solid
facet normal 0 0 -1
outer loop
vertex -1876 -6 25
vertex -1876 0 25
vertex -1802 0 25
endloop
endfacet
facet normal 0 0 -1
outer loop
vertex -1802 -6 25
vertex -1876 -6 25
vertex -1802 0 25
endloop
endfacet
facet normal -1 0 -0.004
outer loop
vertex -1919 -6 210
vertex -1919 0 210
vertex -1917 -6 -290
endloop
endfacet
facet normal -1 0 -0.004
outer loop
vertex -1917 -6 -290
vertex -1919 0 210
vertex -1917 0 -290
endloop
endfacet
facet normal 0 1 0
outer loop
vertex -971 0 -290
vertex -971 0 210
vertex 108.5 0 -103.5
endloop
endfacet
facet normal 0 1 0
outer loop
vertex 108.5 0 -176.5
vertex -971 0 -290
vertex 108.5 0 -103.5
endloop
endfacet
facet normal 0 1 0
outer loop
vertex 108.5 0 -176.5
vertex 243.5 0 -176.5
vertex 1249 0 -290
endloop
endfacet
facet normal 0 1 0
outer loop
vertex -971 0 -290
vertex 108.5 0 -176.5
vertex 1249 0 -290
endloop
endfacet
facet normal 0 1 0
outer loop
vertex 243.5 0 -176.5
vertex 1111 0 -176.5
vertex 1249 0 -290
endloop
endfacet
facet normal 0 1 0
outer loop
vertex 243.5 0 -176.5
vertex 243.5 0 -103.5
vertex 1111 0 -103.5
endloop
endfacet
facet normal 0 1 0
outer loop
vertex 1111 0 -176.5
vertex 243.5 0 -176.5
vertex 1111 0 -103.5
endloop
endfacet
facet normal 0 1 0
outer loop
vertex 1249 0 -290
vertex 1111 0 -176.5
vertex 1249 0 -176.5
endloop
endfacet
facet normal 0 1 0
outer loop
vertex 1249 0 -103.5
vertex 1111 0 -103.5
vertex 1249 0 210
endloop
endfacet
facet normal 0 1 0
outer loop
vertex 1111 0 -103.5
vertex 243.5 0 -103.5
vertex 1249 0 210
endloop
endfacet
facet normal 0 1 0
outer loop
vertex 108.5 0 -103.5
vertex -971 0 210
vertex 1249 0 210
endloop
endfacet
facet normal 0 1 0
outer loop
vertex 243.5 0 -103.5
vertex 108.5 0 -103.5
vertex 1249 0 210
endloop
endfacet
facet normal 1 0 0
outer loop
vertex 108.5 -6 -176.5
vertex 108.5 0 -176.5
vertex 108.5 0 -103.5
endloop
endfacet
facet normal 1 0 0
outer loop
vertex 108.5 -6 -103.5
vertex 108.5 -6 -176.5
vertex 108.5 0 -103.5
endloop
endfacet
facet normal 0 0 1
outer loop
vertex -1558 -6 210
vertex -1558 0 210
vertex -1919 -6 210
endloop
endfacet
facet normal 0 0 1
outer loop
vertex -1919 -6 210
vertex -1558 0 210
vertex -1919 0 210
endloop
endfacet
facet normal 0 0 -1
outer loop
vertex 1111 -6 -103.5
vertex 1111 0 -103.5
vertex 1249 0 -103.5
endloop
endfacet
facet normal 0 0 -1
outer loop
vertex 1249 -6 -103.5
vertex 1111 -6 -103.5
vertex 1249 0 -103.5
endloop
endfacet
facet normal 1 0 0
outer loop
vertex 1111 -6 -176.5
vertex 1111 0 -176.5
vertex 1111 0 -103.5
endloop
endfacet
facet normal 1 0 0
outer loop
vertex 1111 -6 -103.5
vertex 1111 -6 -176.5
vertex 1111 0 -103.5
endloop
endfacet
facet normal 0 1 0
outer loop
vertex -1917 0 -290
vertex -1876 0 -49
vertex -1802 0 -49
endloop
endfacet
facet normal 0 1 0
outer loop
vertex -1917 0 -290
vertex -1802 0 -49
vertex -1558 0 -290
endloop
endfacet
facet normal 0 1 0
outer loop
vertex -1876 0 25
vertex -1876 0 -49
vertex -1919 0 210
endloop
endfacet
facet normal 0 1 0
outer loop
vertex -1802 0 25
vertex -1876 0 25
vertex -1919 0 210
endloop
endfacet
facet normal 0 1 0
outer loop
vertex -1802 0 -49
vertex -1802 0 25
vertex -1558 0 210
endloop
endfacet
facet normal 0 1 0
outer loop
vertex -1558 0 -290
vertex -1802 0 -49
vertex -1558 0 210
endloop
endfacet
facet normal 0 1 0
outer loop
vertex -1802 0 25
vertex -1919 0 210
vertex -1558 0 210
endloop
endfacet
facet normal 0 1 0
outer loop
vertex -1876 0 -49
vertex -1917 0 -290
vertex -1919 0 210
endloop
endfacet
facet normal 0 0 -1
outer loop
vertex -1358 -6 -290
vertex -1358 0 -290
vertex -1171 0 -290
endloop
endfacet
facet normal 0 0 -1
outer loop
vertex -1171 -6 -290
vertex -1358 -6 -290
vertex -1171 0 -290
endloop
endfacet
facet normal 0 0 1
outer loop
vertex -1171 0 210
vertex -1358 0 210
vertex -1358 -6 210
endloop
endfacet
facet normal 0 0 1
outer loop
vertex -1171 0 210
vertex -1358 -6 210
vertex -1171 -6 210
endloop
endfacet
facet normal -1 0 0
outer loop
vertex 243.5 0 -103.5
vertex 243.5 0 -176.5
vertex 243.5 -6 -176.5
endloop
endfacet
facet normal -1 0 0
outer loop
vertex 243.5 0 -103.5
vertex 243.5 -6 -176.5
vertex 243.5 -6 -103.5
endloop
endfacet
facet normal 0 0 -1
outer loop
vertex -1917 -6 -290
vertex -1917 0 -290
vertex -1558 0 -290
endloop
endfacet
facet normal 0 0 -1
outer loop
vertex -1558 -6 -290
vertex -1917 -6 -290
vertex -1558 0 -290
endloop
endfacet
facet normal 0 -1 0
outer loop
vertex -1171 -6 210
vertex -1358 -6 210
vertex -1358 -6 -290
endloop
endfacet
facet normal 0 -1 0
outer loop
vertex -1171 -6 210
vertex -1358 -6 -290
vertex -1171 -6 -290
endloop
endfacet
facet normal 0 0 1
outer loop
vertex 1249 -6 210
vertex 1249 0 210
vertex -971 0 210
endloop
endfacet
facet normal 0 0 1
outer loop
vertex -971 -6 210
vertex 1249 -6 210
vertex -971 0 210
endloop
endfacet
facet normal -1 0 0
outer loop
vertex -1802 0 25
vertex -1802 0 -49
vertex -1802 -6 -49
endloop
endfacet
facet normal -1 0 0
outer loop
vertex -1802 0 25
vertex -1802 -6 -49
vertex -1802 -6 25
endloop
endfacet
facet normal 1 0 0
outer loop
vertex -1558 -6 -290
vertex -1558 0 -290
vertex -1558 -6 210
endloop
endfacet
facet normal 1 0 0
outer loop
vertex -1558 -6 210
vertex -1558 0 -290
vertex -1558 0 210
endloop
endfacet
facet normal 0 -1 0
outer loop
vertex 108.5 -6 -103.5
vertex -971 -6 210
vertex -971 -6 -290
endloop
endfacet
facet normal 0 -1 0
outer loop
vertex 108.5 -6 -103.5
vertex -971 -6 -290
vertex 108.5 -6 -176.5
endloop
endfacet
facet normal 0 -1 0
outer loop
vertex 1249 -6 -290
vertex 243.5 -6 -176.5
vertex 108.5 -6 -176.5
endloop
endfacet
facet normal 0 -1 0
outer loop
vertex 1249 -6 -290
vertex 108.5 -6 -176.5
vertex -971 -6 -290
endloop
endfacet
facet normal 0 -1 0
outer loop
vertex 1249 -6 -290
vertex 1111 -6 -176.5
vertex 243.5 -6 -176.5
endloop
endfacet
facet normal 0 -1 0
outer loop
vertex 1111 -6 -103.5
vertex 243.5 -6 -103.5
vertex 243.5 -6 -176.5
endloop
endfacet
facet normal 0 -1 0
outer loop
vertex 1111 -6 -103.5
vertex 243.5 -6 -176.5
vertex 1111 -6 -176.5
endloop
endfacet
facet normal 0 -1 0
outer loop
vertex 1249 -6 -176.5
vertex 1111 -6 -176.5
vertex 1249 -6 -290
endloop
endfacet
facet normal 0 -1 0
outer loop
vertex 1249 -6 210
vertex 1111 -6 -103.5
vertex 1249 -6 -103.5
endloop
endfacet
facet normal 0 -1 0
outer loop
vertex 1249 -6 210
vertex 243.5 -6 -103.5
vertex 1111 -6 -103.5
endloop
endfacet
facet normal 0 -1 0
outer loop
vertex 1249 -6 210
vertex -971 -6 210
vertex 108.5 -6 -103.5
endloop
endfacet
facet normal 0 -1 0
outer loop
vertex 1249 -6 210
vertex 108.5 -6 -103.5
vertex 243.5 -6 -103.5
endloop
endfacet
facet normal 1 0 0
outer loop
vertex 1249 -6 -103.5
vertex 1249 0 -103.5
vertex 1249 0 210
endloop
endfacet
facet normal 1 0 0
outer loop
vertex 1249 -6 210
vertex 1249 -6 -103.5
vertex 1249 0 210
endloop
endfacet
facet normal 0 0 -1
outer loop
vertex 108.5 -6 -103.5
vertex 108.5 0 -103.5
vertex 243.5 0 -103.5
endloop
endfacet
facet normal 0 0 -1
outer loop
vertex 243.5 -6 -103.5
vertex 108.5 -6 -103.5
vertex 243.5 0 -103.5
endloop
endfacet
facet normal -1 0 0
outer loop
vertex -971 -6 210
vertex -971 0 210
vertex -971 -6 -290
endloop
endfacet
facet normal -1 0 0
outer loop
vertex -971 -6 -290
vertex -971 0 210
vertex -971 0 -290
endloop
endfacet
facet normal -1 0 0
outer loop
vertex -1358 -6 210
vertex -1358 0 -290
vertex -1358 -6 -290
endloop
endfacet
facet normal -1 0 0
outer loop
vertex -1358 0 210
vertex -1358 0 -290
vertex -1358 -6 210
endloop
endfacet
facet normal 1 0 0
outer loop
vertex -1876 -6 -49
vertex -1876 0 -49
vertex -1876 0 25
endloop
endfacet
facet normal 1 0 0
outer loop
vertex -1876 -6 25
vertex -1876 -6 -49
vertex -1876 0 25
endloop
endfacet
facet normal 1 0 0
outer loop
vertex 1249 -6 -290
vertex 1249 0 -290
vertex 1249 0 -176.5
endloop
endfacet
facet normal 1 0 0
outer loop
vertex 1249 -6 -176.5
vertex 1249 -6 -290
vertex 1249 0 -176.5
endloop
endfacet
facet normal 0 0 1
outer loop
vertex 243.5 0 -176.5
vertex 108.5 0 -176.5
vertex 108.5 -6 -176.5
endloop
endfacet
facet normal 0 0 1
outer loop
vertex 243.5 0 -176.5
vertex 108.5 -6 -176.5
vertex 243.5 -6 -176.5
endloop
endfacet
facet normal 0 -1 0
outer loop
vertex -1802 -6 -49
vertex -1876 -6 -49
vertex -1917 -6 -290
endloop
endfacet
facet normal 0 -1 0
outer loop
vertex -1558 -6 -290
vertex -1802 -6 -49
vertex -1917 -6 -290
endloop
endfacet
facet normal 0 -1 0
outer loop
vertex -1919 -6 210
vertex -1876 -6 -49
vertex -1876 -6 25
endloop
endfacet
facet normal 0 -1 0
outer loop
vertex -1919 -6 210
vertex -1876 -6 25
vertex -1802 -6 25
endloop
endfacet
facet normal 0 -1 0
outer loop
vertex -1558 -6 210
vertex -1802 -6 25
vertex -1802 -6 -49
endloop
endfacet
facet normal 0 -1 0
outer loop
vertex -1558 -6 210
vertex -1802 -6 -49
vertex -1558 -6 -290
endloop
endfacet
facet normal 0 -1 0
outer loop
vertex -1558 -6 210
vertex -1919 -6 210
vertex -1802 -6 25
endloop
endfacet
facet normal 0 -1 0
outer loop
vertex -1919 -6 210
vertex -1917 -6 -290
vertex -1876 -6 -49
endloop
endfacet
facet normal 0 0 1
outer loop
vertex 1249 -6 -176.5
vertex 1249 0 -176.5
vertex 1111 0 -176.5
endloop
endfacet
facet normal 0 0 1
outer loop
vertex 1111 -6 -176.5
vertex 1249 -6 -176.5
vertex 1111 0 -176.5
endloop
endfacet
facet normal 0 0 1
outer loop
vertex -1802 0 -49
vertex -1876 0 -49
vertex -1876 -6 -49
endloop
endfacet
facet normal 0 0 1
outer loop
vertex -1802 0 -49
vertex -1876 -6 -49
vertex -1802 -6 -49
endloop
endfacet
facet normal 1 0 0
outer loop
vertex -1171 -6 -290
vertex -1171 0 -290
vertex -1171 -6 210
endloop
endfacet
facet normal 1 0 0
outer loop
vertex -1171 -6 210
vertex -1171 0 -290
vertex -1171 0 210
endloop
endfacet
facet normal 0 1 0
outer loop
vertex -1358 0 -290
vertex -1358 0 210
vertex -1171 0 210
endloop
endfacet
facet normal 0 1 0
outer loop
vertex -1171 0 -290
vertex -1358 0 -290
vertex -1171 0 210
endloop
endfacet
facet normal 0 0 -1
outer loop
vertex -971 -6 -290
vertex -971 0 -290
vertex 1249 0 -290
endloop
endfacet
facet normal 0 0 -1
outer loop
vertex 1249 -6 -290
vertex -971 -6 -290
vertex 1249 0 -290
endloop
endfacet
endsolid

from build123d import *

# Parameters (mm, degrees)
F0_W     = 135
F0_H     = 73
F3_DEPTH = 6
F1_W     = 187
F1_H     = 500
F4_DEPTH = 6
F2_W     = 74
F2_H     = 74
F5_DEPTH = 6


with BuildPart() as f3:
    # F0 (on Front) → F3 (new body)
    with BuildSketch(Plane.XZ):
        Polygon((1249, 210), (-971, 210), (-971, -290), (1249, -290), (1249, -176.5), (1111, -176.5), (1111, -103.5), (1249, -103.5), align=None)
        with Locations((176, -140)):
            Rectangle(F0_W, F0_H, mode=Mode.SUBTRACT)
    extrude(amount=F3_DEPTH)


with BuildPart() as f4:
    # F1 (on Front) → F4 (new body)
    with BuildSketch(Plane.XZ):
        with Locations((-1264.5, -40)):
            Rectangle(F1_W, F1_H)
    extrude(amount=F4_DEPTH)


with BuildPart() as f5:
    # F2 (on Front) → F5 (new body)
    with BuildSketch(Plane.XZ):
        Polygon((-1917, -290), (-1558, -290), (-1558, 210), (-1919, 210), align=None)
        with Locations((-1839, -12)):
            Rectangle(F2_W, F2_H, mode=Mode.SUBTRACT)
    extrude(amount=F5_DEPTH)


solid = Compound([f3.part, f4.part, f5.part])
